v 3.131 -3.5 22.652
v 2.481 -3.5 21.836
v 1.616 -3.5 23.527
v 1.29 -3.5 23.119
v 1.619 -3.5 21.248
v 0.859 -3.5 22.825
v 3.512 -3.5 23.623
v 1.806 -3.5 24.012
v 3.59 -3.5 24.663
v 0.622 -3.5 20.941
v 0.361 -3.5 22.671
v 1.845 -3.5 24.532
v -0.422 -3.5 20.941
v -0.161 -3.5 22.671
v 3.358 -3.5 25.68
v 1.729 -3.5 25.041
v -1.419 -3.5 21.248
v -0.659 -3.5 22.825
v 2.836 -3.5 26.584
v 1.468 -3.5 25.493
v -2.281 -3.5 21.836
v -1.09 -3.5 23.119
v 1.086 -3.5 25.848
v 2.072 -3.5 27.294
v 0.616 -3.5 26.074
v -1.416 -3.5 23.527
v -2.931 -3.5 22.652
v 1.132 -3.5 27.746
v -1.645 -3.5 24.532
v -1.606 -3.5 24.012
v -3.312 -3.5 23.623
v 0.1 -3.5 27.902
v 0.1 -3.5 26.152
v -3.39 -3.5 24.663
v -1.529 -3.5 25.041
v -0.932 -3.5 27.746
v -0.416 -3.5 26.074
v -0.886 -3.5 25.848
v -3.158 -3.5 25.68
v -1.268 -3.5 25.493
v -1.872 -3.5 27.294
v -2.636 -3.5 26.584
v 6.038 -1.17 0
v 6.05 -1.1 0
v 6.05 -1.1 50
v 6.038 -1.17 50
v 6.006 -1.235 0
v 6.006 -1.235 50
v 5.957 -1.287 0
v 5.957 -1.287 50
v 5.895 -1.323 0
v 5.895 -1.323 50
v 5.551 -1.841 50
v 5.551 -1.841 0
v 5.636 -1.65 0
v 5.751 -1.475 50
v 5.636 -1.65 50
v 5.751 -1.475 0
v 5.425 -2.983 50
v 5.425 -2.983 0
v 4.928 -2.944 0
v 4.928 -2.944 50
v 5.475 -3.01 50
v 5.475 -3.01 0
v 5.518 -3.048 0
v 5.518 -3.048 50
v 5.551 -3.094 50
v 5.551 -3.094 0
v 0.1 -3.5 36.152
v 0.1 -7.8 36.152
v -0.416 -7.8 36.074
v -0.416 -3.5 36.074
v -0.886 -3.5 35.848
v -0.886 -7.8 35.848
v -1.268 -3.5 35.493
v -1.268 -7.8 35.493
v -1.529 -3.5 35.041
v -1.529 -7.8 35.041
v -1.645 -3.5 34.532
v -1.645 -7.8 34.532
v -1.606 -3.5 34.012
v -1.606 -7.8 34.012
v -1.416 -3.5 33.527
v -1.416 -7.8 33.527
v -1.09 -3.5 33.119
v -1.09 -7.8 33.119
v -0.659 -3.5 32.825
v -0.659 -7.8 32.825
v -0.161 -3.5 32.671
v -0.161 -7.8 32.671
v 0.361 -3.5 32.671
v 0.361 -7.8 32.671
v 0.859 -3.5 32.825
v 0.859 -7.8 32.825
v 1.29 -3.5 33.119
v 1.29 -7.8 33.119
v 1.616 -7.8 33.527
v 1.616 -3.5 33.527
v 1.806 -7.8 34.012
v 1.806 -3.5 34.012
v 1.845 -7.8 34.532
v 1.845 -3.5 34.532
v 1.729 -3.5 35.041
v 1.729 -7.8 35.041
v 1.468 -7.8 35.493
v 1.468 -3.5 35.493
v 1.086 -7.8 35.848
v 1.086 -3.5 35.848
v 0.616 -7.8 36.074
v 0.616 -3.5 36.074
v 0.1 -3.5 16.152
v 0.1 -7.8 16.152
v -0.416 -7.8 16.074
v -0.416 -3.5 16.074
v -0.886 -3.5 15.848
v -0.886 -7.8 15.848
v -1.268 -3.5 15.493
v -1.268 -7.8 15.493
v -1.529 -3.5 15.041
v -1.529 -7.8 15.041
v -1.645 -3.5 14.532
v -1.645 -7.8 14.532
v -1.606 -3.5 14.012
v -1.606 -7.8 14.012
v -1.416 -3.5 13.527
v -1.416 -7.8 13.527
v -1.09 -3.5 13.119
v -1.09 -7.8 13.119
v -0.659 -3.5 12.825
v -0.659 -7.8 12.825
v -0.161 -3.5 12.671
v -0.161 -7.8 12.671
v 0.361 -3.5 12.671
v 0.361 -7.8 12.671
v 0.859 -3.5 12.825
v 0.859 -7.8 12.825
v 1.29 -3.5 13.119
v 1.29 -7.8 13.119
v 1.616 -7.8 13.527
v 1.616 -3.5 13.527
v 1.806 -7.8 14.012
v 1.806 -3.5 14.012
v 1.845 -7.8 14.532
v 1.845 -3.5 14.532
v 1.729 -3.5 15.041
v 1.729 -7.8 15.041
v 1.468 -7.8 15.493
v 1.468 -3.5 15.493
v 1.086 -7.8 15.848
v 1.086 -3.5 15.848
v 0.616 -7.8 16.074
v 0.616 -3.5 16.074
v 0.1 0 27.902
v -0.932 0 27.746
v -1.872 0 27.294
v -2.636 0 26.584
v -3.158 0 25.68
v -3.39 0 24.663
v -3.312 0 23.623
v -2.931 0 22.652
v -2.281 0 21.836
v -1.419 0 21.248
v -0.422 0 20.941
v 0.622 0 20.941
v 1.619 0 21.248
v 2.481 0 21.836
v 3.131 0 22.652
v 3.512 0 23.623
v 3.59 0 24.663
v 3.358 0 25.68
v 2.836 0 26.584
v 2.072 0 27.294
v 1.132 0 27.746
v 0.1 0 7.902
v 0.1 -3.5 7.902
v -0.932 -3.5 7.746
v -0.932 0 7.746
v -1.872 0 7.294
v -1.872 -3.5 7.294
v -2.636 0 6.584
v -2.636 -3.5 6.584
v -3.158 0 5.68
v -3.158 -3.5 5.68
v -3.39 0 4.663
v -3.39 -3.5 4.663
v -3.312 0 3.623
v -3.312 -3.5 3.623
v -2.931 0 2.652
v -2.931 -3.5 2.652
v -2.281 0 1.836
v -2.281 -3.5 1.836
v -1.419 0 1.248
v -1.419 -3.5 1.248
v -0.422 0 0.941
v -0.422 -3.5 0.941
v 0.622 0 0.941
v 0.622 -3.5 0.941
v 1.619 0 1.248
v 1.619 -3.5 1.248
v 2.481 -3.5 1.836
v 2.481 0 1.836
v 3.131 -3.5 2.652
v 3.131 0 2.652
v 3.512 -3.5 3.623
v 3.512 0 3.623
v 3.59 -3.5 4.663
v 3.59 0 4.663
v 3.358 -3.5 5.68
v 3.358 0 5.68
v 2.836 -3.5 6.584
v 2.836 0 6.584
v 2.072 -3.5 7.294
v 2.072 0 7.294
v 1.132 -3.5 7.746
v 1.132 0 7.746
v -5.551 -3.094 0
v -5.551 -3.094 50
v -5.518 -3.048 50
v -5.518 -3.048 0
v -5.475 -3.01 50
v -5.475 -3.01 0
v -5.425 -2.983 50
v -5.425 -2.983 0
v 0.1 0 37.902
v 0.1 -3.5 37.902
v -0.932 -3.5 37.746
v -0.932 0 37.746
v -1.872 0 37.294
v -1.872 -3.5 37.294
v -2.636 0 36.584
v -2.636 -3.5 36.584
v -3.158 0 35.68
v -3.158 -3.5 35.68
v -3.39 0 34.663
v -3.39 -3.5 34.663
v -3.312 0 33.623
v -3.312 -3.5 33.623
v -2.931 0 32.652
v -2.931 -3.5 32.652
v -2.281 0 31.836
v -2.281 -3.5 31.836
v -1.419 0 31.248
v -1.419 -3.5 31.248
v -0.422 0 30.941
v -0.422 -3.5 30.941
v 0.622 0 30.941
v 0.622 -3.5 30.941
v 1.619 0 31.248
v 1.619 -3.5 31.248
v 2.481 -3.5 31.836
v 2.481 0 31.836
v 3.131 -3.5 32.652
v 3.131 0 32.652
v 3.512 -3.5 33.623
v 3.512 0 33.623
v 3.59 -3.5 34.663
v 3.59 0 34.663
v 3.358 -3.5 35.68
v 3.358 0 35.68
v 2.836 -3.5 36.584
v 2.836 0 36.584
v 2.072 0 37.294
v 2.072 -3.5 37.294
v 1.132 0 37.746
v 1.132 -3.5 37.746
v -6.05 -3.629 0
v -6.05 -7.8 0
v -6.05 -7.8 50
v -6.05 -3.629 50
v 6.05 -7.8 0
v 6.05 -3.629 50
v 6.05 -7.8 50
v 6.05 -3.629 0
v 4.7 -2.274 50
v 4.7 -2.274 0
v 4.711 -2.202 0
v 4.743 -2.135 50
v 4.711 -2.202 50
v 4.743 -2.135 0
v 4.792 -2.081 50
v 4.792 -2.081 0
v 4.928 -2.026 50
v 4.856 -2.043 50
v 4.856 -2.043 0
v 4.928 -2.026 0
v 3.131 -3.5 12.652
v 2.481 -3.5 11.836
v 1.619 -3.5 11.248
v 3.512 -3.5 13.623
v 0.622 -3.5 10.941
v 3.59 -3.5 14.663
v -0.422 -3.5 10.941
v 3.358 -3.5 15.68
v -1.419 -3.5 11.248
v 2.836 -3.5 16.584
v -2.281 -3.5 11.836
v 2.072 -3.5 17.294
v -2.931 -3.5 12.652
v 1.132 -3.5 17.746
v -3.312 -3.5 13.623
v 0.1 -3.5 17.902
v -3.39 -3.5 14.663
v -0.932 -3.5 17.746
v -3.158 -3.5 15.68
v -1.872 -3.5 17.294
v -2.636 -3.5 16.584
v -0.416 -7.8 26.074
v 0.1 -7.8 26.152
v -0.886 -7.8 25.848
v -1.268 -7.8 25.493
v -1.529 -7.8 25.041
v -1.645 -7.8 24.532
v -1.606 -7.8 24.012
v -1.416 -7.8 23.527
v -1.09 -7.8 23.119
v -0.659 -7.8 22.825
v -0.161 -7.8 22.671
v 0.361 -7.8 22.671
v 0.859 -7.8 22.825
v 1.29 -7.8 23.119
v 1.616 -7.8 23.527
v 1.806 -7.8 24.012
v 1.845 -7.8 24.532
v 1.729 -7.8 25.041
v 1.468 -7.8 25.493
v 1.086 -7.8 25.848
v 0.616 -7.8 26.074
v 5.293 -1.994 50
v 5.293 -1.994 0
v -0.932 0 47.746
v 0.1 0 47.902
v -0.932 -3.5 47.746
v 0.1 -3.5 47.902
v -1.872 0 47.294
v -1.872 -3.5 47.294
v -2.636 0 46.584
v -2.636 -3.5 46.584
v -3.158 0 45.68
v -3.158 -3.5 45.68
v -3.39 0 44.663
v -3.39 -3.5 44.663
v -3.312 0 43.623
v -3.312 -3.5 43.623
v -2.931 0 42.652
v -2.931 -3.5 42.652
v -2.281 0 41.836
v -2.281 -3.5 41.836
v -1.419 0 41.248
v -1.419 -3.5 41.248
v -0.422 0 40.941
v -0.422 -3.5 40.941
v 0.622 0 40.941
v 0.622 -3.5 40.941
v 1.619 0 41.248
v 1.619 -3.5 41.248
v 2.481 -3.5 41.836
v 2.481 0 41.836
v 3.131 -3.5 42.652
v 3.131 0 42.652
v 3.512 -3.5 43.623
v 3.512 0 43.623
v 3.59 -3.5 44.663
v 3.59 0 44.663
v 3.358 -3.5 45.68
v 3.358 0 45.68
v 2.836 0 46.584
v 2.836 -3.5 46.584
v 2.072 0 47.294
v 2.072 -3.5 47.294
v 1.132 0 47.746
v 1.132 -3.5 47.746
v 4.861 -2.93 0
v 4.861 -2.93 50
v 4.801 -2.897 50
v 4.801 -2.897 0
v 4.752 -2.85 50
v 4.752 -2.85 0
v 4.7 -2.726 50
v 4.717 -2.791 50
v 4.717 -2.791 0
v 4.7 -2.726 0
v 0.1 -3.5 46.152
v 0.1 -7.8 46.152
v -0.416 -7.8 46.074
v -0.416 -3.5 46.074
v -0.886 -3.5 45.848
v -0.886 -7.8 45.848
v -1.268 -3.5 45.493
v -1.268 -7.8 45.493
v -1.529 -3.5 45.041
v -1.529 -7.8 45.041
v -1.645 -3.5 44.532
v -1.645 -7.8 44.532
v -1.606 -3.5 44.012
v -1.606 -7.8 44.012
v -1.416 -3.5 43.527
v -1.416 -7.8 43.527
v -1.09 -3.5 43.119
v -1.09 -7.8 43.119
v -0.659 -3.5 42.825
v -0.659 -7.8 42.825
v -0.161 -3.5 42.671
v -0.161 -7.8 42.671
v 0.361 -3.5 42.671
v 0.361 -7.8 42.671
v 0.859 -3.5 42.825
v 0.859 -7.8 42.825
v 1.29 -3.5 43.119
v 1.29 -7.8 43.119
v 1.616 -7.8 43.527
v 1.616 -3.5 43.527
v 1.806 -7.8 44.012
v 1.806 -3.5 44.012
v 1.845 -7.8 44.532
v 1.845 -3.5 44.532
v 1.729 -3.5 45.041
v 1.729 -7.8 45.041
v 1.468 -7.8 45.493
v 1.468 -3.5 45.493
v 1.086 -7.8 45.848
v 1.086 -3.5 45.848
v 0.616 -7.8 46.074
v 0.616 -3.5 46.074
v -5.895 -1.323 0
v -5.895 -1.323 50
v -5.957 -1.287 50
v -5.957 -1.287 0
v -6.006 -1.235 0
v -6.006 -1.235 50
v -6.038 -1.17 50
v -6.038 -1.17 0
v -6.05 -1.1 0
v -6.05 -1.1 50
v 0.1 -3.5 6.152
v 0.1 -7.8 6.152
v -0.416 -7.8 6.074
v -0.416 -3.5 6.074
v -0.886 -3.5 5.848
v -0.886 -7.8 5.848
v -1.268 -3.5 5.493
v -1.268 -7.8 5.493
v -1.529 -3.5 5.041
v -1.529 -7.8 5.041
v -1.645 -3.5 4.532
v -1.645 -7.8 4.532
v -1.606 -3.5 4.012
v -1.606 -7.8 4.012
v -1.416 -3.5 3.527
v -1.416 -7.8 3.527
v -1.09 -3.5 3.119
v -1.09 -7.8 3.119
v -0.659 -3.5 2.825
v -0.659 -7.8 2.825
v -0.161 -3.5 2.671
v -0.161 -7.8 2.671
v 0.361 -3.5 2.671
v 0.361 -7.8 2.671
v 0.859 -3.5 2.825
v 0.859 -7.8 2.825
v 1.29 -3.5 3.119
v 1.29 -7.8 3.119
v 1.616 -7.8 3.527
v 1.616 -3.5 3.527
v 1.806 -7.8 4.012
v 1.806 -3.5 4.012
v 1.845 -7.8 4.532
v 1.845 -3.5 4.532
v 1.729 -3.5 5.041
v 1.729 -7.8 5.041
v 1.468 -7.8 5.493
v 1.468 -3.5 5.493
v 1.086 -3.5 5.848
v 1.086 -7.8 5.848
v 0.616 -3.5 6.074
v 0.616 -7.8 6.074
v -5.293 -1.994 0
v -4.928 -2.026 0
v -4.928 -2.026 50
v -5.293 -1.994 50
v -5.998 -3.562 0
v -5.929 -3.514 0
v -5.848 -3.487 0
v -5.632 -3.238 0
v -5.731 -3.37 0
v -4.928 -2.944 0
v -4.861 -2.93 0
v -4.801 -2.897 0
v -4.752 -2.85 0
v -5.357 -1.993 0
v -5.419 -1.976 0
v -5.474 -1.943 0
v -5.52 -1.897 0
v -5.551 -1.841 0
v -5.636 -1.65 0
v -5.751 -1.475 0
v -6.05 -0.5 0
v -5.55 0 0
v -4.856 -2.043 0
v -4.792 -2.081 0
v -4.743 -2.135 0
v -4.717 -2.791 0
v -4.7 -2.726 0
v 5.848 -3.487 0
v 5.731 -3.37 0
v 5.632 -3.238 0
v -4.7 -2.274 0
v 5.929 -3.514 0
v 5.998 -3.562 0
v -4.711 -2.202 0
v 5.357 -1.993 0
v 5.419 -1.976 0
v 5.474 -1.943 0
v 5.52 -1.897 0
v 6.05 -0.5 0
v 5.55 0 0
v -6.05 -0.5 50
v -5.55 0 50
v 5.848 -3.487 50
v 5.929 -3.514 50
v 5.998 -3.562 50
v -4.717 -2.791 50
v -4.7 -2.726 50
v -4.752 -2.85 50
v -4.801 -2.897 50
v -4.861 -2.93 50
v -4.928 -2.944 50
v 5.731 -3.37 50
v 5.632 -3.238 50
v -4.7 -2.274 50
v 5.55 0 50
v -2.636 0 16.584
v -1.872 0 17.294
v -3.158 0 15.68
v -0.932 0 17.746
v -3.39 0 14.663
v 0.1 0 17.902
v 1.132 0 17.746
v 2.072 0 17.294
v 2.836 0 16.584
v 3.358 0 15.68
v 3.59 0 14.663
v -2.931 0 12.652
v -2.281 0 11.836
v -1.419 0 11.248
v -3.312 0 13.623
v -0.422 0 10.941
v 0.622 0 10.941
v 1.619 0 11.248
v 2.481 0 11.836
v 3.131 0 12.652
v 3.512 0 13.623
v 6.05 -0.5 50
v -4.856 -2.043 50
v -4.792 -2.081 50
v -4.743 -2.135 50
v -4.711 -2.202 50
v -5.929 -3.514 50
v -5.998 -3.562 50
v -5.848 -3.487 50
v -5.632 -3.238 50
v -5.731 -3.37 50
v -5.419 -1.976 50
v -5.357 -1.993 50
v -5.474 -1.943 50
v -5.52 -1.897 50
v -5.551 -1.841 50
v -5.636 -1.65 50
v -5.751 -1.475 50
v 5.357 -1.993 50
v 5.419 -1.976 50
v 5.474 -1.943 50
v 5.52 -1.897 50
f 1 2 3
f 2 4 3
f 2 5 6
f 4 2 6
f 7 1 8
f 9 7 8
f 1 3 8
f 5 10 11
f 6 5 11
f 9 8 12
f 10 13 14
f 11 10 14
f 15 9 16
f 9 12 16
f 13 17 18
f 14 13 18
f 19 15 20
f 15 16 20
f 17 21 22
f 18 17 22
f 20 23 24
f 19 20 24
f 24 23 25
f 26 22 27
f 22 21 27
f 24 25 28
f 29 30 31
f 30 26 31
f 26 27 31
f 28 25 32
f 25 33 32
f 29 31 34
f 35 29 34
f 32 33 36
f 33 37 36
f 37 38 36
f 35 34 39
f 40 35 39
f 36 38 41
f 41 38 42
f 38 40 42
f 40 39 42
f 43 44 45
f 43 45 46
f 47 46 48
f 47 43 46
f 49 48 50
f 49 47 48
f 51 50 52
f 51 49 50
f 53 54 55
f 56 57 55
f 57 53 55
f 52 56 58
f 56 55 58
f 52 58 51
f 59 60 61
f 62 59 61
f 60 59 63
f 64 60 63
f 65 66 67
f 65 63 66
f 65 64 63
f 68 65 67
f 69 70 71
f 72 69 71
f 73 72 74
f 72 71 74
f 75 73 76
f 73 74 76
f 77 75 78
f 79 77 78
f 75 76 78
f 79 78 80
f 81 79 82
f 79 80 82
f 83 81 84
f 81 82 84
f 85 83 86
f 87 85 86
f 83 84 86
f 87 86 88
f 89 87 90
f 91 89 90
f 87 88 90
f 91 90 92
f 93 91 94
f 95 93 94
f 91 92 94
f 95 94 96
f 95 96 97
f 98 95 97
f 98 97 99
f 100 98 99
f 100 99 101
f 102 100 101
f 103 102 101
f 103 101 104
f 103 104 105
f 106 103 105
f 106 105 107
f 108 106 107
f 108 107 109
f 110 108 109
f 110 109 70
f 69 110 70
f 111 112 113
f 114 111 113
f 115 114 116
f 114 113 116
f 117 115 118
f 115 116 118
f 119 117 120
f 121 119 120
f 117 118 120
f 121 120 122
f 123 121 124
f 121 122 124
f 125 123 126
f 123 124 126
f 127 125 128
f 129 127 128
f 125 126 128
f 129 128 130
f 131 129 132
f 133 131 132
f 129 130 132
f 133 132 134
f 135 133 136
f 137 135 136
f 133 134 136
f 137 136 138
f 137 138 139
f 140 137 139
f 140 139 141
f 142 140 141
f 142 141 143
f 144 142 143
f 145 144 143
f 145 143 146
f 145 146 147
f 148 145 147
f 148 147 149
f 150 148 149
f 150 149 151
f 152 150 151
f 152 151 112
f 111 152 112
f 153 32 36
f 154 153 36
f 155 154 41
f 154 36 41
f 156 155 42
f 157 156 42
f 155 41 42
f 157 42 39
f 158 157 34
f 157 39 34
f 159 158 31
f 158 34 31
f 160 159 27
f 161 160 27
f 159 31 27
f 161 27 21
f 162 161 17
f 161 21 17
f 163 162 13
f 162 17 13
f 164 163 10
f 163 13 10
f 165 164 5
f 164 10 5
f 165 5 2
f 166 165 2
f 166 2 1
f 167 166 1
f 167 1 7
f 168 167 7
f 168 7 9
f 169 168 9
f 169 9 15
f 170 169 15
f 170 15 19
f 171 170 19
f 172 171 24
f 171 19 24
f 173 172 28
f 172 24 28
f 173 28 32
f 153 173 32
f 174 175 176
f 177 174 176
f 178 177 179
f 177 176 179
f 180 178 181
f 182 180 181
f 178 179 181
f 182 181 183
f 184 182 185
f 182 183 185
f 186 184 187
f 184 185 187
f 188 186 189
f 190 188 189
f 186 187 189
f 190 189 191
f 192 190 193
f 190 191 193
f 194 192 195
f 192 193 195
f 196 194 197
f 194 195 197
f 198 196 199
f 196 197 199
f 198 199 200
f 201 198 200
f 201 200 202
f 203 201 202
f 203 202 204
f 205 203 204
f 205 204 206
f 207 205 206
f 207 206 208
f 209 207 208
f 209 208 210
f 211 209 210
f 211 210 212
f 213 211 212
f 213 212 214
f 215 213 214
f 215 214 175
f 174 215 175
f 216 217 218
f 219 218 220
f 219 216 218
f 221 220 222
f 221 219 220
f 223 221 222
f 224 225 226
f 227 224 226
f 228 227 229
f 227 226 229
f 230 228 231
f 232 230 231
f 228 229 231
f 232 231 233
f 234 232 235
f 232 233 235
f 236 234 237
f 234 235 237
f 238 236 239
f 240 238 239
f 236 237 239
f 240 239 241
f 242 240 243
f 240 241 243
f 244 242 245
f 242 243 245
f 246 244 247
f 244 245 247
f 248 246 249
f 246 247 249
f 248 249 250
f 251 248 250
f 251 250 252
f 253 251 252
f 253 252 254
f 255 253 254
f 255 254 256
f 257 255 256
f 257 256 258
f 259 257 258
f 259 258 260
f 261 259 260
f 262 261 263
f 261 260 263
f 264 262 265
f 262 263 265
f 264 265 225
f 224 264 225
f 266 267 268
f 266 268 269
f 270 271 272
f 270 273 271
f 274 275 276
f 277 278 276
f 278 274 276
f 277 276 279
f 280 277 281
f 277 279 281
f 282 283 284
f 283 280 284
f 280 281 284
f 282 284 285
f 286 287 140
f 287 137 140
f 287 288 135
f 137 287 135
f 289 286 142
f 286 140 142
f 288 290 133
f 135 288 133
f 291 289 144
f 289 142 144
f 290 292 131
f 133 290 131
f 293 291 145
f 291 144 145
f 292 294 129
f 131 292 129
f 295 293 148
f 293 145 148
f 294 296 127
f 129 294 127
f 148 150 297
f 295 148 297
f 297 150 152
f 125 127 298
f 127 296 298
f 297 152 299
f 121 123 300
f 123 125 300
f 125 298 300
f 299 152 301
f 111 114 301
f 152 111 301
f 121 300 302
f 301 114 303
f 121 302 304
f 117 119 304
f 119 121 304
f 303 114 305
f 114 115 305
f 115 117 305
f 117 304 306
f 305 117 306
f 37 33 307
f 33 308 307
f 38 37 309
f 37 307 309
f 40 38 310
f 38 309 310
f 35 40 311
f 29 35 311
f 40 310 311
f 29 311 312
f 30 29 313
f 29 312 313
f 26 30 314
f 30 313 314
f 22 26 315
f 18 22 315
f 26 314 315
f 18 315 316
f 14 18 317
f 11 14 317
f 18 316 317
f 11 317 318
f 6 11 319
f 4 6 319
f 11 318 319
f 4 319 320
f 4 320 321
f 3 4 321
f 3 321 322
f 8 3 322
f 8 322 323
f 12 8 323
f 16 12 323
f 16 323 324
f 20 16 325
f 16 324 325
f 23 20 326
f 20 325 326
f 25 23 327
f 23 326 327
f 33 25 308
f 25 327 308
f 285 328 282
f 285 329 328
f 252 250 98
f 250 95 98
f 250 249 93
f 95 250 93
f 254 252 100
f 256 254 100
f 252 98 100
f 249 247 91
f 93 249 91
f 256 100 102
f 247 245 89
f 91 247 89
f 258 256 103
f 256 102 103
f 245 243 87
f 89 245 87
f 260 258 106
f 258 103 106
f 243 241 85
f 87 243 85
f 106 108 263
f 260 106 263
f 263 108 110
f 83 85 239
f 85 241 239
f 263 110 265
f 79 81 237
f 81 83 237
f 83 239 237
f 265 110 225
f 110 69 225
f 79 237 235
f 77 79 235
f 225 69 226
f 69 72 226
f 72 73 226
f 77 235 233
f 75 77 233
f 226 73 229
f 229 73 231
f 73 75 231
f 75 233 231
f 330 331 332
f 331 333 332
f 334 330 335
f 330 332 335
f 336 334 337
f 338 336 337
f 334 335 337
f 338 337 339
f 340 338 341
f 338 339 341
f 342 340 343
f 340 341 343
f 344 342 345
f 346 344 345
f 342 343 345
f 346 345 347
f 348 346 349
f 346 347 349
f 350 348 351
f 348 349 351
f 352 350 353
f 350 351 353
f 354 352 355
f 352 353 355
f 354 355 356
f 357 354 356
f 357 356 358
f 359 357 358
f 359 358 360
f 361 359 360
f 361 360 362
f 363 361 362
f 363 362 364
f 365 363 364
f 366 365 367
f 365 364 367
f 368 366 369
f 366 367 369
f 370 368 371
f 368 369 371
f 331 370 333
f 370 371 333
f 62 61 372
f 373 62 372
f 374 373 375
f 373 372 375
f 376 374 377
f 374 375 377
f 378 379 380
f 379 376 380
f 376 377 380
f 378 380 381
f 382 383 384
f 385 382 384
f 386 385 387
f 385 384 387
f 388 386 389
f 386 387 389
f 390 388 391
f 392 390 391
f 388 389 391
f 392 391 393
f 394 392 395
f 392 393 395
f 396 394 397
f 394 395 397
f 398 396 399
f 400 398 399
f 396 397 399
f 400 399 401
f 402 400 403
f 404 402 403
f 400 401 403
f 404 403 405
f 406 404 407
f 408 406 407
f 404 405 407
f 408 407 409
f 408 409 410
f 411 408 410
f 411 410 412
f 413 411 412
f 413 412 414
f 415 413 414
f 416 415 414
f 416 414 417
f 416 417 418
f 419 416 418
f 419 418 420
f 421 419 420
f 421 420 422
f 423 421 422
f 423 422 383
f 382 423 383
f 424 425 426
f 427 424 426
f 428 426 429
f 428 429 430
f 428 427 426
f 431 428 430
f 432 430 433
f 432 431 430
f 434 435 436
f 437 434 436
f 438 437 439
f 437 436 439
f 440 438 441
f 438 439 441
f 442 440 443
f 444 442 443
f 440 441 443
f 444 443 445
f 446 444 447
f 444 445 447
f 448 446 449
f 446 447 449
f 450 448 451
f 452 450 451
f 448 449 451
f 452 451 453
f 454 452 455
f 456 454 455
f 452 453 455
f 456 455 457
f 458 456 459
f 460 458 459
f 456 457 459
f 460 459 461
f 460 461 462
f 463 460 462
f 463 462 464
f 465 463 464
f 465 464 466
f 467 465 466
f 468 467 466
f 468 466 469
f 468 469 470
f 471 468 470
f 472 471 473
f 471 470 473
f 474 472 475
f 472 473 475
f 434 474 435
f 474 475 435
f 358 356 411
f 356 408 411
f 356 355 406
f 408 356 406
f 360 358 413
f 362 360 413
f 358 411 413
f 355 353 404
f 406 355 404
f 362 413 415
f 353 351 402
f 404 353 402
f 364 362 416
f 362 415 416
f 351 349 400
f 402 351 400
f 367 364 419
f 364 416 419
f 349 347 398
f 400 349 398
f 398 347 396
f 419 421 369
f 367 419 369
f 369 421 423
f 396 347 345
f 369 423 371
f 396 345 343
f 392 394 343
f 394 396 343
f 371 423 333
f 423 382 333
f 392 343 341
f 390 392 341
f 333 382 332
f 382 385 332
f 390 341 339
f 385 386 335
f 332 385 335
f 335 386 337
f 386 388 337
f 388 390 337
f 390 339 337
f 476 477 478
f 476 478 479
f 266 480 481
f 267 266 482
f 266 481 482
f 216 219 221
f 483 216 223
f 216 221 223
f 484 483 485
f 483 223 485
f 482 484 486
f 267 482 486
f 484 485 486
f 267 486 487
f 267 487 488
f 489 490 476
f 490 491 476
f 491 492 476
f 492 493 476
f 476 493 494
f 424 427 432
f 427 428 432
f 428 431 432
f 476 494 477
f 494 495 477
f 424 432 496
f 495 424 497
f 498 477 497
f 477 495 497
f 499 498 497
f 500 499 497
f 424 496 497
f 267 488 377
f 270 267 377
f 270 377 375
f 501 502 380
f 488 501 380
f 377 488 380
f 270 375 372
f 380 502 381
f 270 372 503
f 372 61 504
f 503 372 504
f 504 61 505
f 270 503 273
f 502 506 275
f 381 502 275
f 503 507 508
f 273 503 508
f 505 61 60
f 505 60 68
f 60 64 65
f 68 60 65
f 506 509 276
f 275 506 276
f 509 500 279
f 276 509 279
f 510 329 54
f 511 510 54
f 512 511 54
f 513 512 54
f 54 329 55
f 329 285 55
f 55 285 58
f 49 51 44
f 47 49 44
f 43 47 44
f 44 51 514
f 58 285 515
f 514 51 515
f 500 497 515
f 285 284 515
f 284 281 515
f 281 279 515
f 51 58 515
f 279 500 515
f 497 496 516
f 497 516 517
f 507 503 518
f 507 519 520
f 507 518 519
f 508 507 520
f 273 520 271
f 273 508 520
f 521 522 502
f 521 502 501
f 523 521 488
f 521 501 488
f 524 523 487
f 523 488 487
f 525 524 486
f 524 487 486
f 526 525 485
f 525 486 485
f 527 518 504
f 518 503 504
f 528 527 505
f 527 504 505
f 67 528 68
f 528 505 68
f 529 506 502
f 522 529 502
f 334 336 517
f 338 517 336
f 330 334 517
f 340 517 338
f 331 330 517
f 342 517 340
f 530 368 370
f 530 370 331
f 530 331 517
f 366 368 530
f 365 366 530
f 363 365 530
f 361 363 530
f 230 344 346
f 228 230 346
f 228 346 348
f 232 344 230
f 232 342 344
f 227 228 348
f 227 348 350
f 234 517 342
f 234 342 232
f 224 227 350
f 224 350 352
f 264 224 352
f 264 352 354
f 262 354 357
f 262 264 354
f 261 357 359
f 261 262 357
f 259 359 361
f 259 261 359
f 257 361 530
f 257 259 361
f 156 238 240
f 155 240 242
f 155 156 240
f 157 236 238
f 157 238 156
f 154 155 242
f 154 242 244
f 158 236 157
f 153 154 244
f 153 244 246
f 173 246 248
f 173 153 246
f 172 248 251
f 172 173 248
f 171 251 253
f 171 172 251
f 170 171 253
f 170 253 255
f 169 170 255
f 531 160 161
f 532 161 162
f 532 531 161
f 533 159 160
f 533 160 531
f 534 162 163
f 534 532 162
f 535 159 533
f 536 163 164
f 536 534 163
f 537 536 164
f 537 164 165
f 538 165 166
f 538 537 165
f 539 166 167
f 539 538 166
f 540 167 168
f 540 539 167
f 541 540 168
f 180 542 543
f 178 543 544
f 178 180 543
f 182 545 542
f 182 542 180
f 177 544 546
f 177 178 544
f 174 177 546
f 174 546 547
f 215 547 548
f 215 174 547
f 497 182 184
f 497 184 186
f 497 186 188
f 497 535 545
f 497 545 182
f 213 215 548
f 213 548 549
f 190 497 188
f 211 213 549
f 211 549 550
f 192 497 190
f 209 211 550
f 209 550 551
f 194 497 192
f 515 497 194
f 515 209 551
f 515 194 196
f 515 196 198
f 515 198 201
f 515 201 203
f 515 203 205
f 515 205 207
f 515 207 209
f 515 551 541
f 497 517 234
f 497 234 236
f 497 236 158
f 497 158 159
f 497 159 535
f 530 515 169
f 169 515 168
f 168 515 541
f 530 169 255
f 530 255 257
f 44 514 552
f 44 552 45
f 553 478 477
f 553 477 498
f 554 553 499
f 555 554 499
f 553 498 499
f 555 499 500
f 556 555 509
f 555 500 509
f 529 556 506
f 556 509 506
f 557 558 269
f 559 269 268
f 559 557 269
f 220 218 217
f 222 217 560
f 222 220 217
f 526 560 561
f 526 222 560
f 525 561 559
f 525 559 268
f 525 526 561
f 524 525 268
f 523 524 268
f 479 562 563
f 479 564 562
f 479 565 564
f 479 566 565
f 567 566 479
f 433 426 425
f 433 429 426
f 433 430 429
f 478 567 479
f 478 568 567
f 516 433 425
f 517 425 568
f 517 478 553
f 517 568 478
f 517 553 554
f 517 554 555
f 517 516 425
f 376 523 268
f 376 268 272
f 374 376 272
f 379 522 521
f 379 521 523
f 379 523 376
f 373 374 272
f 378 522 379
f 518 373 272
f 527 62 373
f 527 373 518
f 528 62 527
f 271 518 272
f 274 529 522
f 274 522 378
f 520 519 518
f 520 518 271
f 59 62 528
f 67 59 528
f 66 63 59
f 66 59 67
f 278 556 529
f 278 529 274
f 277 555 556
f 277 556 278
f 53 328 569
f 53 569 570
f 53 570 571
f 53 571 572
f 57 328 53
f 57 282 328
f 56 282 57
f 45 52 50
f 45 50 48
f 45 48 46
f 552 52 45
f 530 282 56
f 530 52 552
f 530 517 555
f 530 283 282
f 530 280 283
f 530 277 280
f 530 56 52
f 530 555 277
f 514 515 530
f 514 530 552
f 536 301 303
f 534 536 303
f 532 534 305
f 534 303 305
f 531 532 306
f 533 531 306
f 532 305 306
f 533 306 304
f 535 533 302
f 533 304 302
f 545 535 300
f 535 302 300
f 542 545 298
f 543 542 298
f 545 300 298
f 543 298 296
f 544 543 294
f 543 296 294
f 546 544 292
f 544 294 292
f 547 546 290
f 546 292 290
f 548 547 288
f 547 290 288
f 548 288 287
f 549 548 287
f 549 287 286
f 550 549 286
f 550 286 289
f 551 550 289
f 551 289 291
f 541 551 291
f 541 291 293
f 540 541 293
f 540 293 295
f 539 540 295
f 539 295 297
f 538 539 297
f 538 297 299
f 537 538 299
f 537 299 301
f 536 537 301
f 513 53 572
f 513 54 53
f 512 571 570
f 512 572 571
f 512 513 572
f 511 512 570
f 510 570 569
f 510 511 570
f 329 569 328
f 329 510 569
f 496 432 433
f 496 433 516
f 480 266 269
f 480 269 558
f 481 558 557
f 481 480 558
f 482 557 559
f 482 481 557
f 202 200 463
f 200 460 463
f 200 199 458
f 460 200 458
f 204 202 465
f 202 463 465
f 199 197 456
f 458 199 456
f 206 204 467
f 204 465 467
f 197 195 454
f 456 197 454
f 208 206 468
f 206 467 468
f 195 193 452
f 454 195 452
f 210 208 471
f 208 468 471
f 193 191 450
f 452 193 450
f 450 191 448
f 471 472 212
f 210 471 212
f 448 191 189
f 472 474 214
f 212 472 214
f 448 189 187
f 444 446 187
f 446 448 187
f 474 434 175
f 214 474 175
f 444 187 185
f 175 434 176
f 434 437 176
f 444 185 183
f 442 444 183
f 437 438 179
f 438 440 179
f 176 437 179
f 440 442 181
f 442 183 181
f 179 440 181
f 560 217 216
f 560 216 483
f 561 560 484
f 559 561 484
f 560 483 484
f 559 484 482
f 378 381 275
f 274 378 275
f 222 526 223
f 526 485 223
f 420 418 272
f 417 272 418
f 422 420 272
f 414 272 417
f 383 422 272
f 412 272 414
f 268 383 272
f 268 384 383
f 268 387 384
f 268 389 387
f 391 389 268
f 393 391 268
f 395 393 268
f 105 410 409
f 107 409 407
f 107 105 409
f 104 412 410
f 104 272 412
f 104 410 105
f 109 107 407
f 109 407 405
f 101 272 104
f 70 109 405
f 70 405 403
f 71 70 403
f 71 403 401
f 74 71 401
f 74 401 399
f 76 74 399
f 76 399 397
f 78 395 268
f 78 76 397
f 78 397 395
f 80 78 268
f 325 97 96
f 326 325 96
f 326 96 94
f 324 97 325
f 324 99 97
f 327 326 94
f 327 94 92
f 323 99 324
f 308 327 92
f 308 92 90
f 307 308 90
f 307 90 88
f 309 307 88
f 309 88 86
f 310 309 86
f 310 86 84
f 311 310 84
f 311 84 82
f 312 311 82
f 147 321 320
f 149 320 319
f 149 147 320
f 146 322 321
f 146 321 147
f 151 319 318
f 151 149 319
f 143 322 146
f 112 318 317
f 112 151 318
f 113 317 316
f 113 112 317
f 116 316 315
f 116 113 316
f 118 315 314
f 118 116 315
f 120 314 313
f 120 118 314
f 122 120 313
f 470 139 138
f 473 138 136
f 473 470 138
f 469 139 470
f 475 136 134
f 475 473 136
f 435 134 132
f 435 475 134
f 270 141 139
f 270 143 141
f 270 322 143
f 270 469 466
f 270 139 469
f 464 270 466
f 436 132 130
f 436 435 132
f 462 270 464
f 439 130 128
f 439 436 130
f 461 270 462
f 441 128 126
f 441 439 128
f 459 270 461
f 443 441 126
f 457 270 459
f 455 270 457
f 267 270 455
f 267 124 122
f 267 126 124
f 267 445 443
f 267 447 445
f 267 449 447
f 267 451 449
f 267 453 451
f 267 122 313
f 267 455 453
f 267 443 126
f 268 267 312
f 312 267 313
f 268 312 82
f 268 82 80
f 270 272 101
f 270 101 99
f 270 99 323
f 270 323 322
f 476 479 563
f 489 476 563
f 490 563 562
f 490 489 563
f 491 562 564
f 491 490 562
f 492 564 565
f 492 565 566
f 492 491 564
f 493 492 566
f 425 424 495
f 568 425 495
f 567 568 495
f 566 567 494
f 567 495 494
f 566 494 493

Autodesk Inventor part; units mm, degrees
ref_plane "YZ Plane" through (0, 0, 0) normal (1, 0, 0) x (0, 1, 0)
ref_plane "XZ Plane" through (0, 0, 0) normal (0, 1, 0) x (-1, 0, 0)
ref_plane "XY Plane" through (0, 0, 0) normal (0, 0, 1) x (1, 0, 0)
ref_plane "Work Plane1" through (0, 0, 0) normal (0, 0, 1) x (1, 0, 0)
sketch "Sketch1" plane through (0, 0, 0) normal (0, 0, 1) x (1, 0, 0)
  line L0 (0, 0) -> (5.55, 0)
  line L1 (6.05, -7.8) -> (0, -7.8)
  line L2 (0, -7.8) -> (0, 0)
  line L3 (5.55, 0) -> (6.05, -0.5)
  arc A0 (6.05, -3.6294) -> (5.8482, -3.4873) centre (5.8013, -3.7683) ccw
  arc A1 (5.5514, -3.0941) -> (5.8482, -3.4873) centre (6.6343, -2.5853) ccw
  arc A2 (5.5514, -3.0941) -> (5.425, -2.9829) centre (5.3332, -3.2146) ccw
  line L4 (5.425, -2.9829) -> (4.928, -2.9441)
  arc A3 (4.7, -2.7255) -> (4.928, -2.9441) centre (4.9475, -2.6956) ccw
  arc A4 (4.9275, -2.0261) -> (4.7, -2.2744) centre (4.9493, -2.2744) ccw
  arc A5 (5.293, -1.9942) -> (5.5514, -1.8412) centre (5.3208, -1.7464) ccw
  arc A6 (5.8954, -1.3233) -> (5.5514, -1.8412) centre (6.7024, -2.2326) ccw
  arc A7 (5.8954, -1.3233) -> (6.05, -1.1) centre (5.8008, -1.0927) ccw
  line L5 (5.293, -1.9942) -> (4.9275, -2.0261)
  line L6 (4.7, -2.7255) -> (4.7, -2.2744)
  line L7 (6.05, -0.5) -> (6.05, -1.1)
  line L8 (6.05, -3.6294) -> (6.05, -7.8)
  point P0 (6.05, 0)
  dimension "d0" = 0.5
  dimension "d1" = 0.5
  dimension "d17" = 6.05
  dimension "d18" = 7.8
  dimension "d20" = 2.6756
  dimension "d21" = 0.5
  dimension "d22" = 1.1
  dimension "d23" = 4.7
  dimension "d24" = 0.2275
  dimension "d25" = 0.228
  dimension "d26" = 0
  dimension "d27" = 0.2483
  dimension "d28" = 0.2186
extrude "Extrusion1" add sketch "Sketch1" along normal blind 50
mirror "Mirror1" about plane through (0, 0, 0) normal (-1, 0, 0) of "Extrusion1"
sketch "Sketch2" plane through (5.55, 0, 50) normal (0, 1, 0) x (1, 0, 0)
  line L0 (-11.1, 50) -> (0, 50) projected
  line L1 (-11.1, 50) -> (-11.1, 0) projected
  line L2 (0, 0) -> (-11.1, 0) projected
  line L3 (0, 50) -> (0, 0) projected
  point P0 (-5.55, 50)
  point P1 (-5.45, 45.5983)
hole "Hole1" at (0.1, 0, 4.4017) direction (0, -1, 0) diameter 3.5 end through all counterbore diameter 7 counterbore depth 3.5
pattern_linear "Rectangular Pattern1" count 5 spacing 10 along (0, 0, 1) of "Hole1"
ref_plane "Work Plane2" through (0, -7.8, 0) normal (1, 0, 0) x (0, 0, -1)
equation "\"d1\" = d0"
properties part number "30_Cube_Z_Focus_MGN_NEMA_rail"
